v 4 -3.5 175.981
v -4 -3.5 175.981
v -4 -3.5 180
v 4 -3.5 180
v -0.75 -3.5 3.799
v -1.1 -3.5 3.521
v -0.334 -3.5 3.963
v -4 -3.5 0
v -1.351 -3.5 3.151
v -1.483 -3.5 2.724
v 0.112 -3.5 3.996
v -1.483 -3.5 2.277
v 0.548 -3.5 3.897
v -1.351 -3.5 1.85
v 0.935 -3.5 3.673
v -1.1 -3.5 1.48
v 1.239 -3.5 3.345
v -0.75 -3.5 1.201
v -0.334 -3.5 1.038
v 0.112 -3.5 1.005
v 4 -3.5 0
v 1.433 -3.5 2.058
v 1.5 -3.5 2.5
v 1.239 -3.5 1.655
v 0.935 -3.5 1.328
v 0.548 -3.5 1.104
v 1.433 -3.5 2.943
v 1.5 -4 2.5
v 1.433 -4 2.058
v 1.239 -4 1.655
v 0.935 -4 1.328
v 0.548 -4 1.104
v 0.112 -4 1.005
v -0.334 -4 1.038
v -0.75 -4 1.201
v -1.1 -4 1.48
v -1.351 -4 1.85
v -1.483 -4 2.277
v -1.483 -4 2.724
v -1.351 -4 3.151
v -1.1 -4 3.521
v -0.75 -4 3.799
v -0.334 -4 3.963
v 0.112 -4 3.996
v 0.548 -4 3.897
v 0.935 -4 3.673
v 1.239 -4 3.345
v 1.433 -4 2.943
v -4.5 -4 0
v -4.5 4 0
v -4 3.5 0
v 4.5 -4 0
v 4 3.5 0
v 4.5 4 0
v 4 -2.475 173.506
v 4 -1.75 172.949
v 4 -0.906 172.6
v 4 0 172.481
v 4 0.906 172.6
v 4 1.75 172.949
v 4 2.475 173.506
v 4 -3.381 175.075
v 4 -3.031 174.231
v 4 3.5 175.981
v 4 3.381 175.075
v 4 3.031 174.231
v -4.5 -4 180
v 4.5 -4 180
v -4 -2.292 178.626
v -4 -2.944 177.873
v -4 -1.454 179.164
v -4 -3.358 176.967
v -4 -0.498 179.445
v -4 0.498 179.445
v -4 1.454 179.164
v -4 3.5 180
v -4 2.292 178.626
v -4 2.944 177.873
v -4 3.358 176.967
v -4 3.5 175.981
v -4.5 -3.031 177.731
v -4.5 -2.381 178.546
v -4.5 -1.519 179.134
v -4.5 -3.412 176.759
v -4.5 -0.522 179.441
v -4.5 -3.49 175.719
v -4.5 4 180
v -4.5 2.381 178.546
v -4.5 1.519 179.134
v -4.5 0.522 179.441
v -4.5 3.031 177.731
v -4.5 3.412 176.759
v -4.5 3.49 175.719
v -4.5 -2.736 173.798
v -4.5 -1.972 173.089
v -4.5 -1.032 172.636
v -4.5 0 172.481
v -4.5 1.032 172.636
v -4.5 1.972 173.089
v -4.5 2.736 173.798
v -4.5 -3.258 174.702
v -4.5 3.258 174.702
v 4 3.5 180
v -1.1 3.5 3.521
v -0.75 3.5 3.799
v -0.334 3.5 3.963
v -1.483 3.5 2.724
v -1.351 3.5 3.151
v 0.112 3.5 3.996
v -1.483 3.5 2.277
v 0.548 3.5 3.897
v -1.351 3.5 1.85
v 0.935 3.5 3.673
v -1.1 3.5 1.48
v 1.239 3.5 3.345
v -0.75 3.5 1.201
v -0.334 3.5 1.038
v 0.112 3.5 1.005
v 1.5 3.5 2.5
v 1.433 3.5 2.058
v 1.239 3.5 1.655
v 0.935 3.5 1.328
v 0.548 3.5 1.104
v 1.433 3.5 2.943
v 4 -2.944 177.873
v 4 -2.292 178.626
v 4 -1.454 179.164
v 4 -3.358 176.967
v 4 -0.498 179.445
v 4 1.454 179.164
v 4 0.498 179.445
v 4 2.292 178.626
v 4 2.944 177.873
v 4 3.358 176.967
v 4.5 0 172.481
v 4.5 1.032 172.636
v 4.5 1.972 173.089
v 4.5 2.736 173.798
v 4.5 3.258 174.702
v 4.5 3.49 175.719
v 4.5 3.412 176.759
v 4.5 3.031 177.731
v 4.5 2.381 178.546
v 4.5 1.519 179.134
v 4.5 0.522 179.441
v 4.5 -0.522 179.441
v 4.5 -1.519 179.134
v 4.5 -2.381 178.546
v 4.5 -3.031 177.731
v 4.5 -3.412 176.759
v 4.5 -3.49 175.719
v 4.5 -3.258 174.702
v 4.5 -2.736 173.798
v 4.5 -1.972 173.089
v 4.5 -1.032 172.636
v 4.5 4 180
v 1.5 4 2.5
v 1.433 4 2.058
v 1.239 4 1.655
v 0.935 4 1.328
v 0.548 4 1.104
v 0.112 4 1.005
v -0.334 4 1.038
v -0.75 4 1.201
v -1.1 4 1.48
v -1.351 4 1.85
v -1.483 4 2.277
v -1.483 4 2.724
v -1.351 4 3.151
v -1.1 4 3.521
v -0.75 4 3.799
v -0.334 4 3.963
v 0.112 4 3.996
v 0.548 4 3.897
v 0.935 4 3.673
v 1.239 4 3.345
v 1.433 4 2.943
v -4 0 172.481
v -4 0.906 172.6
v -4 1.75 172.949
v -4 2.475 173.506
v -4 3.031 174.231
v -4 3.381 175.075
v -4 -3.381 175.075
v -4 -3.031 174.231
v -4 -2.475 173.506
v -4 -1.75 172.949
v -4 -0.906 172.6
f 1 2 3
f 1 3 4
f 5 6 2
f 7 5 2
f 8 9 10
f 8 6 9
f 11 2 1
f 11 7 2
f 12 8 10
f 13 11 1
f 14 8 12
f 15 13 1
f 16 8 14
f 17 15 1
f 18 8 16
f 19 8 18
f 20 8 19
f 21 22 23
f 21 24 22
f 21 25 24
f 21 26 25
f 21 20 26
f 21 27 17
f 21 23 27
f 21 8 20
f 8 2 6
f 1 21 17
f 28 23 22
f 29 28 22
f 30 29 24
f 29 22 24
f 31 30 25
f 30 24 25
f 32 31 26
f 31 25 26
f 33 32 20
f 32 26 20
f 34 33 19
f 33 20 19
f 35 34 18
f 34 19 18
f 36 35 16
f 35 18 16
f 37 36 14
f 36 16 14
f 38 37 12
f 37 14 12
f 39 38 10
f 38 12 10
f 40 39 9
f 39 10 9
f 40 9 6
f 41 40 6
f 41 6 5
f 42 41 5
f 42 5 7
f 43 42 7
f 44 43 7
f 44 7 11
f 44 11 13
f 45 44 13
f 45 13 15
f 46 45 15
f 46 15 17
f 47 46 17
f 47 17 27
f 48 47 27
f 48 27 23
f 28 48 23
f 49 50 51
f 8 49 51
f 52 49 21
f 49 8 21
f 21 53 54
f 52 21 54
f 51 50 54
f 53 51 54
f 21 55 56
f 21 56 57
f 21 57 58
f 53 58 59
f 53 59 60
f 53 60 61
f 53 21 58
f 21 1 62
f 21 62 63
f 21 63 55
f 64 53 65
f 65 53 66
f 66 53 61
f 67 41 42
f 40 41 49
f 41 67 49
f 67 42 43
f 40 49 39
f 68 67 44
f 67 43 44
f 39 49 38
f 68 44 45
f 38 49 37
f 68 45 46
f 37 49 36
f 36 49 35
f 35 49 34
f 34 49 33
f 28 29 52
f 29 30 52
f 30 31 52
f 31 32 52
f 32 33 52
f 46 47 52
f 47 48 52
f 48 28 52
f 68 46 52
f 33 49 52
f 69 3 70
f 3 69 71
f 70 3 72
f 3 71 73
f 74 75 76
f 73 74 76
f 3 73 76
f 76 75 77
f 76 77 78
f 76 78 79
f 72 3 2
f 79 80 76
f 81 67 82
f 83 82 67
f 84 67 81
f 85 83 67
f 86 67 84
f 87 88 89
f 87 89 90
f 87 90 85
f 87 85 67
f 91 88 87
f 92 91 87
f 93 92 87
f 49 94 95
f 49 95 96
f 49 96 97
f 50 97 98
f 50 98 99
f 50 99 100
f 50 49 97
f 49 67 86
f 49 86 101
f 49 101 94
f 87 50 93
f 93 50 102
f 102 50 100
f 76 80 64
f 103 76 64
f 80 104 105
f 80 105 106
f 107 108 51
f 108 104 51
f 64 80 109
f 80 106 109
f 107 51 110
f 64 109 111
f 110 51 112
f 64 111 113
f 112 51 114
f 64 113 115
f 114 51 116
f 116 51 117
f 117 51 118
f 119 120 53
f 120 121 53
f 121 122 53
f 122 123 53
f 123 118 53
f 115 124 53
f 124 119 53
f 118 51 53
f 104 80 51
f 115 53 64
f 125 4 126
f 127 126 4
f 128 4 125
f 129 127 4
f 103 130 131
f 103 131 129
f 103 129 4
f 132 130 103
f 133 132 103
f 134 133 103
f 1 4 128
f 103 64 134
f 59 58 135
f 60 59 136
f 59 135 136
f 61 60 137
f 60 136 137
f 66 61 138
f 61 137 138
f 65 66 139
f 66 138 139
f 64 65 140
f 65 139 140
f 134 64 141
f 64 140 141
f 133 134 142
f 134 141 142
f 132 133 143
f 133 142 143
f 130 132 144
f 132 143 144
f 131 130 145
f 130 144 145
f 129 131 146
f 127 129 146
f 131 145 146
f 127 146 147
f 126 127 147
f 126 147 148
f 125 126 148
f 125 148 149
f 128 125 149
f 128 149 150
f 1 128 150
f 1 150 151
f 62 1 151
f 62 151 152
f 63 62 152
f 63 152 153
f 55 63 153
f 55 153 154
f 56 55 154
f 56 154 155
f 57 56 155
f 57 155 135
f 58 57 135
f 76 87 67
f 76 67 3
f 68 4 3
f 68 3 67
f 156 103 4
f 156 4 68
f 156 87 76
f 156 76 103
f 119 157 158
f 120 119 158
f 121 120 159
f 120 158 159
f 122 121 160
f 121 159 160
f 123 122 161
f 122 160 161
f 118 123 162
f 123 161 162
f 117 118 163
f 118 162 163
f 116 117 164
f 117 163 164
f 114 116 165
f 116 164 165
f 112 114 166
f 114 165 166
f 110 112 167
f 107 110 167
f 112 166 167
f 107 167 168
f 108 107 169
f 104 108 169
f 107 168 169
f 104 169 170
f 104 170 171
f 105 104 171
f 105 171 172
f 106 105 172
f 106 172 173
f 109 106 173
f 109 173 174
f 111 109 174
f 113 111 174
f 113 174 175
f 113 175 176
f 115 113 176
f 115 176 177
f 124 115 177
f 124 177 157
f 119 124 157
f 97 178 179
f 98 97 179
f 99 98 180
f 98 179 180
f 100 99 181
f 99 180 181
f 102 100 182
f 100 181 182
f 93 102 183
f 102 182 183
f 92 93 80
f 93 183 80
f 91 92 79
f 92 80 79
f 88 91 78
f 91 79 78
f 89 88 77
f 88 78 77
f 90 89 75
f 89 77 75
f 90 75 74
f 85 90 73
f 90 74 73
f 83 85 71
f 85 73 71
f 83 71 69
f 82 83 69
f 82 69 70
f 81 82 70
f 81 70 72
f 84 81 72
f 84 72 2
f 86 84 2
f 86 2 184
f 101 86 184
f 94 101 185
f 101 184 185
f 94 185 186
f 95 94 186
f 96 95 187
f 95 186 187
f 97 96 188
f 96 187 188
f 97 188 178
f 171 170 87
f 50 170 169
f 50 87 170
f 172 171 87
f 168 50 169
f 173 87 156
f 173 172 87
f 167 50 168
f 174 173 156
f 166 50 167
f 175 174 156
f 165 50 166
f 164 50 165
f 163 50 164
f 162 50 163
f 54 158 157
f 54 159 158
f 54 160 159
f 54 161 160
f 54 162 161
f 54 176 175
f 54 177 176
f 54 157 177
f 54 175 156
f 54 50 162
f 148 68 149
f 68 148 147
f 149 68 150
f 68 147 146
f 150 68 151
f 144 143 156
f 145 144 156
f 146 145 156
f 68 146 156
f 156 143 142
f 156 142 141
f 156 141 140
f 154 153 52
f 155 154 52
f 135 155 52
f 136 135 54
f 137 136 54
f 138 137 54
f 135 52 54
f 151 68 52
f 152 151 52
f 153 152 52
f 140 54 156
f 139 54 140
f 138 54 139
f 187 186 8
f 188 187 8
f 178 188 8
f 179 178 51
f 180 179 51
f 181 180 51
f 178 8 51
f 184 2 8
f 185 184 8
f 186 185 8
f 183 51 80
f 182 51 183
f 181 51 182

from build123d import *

# Parameters (mm, degrees)
SKETCH2_W           = 9
SKETCH2_H           = 8
BOSS_EXTRUDE1_DEPTH = 180
SKETCH3_R           = 1.5
CUT_EXTRUDE1_DEPTH  = 9
SKETCH4_W           = 8
SKETCH4_H           = 7
CUT_EXTRUDE2_DEPTH  = 181
SKETCH5_R           = 3.5
CUT_EXTRUDE3_DEPTH  = 10


with BuildPart() as part:
    # Sketch2 → Boss-Extrude1 (new body)
    with BuildSketch(Plane.XY):
        Rectangle(SKETCH2_W, SKETCH2_H)
    extrude(amount=BOSS_EXTRUDE1_DEPTH)

    # Sketch3 → Cut-Extrude1 (cut, through all)
    with BuildSketch(Plane(origin=(0, 4, 0), x_dir=(1, 0, 0), z_dir=(0, 1, 0))):
        with Locations((0, -2.500384155)):
            Circle(SKETCH3_R)
    extrude(amount=-CUT_EXTRUDE1_DEPTH, mode=Mode.SUBTRACT)

    # Sketch4 → Cut-Extrude2 (cut, through all)
    with BuildSketch(Plane.XY):
        Rectangle(SKETCH4_W, SKETCH4_H)
    extrude(amount=CUT_EXTRUDE2_DEPTH, mode=Mode.SUBTRACT)

    # Sketch5 → Cut-Extrude3 (cut, through all)
    with BuildSketch(Plane(origin=(4.5, 0, 0), x_dir=(0, 0, -1), z_dir=(1, 0, 0))):
        with Locations((-175.980500671, 0)):
            Circle(SKETCH5_R)
    extrude(amount=-CUT_EXTRUDE3_DEPTH, mode=Mode.SUBTRACT)


solid = part.part
